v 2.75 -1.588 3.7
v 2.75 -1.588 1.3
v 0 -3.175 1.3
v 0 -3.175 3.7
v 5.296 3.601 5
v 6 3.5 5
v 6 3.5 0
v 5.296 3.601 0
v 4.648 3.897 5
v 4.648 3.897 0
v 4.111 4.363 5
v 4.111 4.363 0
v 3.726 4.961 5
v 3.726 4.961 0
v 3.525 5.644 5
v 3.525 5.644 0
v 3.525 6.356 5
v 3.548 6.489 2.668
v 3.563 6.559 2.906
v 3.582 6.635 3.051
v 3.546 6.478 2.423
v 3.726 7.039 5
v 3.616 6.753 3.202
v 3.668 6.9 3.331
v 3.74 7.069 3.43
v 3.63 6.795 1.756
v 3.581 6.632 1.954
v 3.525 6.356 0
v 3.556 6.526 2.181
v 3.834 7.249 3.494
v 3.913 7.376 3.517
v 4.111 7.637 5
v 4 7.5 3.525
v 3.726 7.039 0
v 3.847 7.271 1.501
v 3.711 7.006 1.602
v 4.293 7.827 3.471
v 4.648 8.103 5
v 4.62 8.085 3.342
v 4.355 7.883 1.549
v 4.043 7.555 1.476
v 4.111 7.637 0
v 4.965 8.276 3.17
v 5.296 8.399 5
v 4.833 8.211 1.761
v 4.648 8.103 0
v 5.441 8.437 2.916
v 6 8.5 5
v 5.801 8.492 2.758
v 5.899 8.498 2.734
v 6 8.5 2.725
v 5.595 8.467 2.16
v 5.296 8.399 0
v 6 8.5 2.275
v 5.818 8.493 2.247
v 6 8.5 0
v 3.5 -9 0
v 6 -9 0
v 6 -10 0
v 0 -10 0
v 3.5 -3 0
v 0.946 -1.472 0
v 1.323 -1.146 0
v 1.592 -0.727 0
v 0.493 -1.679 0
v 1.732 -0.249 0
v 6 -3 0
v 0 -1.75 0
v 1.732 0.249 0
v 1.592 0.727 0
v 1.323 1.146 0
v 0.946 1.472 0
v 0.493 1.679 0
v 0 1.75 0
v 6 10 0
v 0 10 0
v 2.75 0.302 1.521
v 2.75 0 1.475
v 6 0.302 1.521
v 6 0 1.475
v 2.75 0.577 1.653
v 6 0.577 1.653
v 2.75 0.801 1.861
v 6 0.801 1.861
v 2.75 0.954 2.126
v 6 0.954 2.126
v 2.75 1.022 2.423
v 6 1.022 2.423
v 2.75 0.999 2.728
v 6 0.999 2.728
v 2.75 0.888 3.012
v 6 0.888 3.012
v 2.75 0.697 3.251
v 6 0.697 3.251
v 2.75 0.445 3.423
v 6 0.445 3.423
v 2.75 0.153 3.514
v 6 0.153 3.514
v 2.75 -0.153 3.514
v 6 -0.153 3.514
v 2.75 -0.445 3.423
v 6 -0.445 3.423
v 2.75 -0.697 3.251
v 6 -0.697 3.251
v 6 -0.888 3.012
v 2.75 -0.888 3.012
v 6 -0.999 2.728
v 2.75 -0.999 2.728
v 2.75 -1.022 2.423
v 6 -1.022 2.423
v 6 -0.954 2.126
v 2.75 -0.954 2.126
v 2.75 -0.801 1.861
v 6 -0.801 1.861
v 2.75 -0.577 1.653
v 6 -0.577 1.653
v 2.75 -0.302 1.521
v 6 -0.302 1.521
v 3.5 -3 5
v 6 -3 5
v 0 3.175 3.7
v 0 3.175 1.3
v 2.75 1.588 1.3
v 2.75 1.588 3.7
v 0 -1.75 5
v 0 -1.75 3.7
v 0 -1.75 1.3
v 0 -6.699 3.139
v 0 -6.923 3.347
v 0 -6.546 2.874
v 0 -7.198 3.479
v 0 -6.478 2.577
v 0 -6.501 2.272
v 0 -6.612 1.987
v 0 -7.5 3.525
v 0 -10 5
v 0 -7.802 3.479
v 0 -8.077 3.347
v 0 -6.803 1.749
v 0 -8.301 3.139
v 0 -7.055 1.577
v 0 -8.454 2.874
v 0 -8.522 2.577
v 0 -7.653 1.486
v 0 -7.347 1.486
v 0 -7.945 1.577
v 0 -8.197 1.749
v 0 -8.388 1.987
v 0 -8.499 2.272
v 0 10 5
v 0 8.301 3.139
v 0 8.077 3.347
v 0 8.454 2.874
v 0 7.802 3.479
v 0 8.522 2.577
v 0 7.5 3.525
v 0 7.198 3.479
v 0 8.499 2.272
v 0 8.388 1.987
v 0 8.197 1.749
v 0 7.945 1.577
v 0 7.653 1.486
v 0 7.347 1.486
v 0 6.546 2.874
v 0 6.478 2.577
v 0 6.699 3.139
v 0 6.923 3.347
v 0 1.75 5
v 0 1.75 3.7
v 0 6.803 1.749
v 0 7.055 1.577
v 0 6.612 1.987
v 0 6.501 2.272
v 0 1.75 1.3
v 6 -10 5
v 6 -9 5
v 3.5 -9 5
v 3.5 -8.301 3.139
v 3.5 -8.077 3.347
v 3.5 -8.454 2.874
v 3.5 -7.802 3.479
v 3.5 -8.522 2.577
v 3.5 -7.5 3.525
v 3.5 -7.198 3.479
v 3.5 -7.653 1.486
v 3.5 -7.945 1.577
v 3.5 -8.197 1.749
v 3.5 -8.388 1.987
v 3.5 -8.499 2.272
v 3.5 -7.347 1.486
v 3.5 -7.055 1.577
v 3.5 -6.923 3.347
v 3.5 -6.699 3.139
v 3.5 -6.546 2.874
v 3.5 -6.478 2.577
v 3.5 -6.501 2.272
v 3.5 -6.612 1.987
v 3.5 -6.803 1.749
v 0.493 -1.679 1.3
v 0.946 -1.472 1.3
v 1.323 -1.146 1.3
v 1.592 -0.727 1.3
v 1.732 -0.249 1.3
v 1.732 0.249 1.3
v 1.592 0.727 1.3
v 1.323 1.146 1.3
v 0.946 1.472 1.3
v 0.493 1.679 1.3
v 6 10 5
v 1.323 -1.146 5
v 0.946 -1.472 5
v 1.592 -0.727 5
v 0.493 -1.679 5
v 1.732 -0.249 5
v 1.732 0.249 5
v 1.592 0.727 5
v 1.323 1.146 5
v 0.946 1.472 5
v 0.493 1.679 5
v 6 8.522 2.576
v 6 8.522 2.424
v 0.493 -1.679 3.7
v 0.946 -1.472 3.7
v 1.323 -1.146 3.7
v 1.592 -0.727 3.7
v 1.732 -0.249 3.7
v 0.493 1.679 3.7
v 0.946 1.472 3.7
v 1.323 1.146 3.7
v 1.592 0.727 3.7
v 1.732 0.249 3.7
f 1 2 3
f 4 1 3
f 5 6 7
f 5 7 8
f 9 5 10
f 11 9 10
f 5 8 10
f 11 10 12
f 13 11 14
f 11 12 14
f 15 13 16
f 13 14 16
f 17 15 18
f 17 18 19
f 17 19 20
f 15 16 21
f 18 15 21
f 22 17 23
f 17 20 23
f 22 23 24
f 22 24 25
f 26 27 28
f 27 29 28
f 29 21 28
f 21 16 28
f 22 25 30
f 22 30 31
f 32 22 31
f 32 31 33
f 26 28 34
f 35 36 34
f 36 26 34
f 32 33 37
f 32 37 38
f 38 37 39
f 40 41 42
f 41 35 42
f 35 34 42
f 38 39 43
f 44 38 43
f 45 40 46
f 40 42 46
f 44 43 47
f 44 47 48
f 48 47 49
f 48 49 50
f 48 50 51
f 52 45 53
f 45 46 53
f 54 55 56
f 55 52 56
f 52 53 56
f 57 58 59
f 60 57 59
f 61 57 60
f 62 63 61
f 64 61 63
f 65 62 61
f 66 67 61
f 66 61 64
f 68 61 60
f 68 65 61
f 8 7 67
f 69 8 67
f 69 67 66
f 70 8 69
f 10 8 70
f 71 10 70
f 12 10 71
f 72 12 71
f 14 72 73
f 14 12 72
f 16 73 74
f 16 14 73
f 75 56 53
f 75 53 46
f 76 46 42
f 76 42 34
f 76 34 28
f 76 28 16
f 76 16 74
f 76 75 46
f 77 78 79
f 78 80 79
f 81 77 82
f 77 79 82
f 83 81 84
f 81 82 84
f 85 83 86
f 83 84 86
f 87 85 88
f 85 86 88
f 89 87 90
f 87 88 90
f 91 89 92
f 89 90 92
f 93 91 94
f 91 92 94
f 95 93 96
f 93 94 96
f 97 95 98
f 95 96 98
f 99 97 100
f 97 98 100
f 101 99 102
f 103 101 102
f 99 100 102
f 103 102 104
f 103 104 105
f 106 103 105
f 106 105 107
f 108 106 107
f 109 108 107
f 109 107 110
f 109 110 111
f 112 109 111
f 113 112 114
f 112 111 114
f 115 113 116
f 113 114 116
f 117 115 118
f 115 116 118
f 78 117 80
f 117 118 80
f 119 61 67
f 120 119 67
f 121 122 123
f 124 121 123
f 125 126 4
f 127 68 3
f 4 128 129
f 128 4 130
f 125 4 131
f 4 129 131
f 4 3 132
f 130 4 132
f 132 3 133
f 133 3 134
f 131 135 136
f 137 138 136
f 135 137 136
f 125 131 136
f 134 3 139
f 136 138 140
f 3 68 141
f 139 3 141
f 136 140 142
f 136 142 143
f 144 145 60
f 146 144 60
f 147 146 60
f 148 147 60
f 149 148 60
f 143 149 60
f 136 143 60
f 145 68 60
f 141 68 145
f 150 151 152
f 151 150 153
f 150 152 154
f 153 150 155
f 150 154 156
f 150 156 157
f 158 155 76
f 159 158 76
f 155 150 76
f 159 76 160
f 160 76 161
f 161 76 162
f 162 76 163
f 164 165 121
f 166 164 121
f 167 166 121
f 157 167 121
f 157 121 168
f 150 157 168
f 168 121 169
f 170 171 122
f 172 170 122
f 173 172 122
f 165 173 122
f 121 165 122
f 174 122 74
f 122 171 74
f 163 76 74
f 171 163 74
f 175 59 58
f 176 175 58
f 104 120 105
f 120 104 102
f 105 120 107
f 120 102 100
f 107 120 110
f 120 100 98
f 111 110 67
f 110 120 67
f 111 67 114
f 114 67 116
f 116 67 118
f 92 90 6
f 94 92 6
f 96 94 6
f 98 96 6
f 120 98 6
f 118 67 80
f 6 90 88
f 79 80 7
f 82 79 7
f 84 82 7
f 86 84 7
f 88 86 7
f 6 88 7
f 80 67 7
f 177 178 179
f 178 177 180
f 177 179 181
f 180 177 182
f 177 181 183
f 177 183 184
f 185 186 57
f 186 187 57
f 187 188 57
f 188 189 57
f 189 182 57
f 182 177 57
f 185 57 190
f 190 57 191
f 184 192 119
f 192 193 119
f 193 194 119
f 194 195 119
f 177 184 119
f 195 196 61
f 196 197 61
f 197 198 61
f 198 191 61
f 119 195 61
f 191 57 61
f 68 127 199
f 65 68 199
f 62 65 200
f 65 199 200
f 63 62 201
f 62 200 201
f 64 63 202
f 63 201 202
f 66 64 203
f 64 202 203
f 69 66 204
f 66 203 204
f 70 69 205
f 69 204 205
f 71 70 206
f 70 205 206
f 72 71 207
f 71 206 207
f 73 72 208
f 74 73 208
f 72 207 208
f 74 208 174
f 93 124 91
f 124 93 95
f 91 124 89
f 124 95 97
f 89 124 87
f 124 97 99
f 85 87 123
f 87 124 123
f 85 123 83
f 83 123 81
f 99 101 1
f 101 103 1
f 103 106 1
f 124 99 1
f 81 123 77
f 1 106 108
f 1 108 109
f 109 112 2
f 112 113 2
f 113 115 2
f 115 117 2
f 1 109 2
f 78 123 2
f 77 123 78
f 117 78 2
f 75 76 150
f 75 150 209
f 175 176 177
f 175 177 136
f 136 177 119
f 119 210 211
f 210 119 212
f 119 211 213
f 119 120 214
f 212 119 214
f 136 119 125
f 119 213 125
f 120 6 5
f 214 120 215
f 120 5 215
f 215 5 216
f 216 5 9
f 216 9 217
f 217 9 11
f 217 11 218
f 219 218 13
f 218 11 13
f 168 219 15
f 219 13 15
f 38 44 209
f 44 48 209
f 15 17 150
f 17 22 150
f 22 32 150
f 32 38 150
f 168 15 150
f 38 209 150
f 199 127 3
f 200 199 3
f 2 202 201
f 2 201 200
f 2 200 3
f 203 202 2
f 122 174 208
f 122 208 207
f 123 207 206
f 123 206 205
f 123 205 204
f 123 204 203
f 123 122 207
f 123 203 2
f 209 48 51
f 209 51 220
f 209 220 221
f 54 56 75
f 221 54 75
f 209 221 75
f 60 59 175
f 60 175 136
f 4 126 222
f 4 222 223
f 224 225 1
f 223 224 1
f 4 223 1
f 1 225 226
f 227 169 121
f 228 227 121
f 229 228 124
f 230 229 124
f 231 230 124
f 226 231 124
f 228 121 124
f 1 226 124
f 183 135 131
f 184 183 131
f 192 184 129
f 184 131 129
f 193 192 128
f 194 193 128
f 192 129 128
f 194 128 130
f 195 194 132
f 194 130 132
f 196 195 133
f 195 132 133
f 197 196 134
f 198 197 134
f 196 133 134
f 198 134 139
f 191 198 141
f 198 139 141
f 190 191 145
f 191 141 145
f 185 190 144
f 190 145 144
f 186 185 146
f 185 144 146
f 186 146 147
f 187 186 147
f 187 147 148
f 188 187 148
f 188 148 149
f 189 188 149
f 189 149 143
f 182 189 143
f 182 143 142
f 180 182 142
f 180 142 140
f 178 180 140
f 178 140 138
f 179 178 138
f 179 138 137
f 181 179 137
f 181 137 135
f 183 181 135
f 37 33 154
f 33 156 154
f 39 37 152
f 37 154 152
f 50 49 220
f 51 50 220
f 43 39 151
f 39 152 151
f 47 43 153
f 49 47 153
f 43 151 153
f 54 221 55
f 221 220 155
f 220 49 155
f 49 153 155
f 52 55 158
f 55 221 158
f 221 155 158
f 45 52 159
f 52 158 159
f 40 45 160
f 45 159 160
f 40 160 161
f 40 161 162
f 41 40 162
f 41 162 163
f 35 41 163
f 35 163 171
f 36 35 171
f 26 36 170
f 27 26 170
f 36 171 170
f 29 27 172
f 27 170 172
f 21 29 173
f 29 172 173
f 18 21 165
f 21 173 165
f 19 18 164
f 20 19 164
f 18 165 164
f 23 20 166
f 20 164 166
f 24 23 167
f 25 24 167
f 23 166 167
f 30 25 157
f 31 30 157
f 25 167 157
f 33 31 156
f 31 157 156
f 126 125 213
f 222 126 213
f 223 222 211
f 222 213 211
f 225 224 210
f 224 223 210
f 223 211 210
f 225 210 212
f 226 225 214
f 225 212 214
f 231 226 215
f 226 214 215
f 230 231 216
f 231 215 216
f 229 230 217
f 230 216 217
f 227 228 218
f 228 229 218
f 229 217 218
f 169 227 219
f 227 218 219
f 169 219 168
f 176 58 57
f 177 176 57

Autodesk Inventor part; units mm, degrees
ref_plane "YZ Plane" through (0, 0, 0) normal (1, 0, 0) x (0, 1, 0)
ref_plane "XZ Plane" through (0, 0, 0) normal (0, 1, 0) x (-1, 0, 0)
sketch "Sketch1" plane through (0, 0, 0) normal (0, 0, 1) x (1, 0, 0)
  line L0 (10, -10) -> (-10, -10)
  line L1 (-10, -10) -> (-10, 10)
  line L2 (-10, 10) -> (10, 10)
  line L3 (10, 10) -> (10, -10)
  line L4 (10, -10) -> (-10, 10) construction
  line L5 (-10, -10) -> (10, 10) construction
  line L6 (10, -10) -> (6, -10)
  line L7 (6, -10) -> (6, 10)
  line L8 (6, 10) -> (10, 10)
  line L9 (10, 10) -> (10, -10)
  line L10 (6, 2) -> (4, 2)
  line L11 (4, 2) -> (4, -2)
  line L12 (4, -2) -> (6, -2)
  line L13 (6, -2) -> (6, 2)
  line L14 (0, 10) -> (0, -10)
  point P0 (0, 0)
  dimension "d0" = 20
  dimension "d1" = 20
  dimension "d2" = 4
  dimension "d6" = 2
  dimension "d7" = 2
  dimension "d8" = 4
  dimension "d9" = 2
extrude "Extrusion1" add sketch "Sketch1" along normal blind 5 contours L0 L14 L2 L7 L10 L11 L12
ref_plane "Work Plane1" through (0, 0, 2.5) normal (0, 0, 1) x (1, 0, 0)
sketch "Sketch2" plane through (0, 0, 2.5) normal (0, 0, 1) x (1, 0, 0)
  line L0 (0, 10) -> (0, -10) projected
  line L1 (0, 3.1754) -> (2.75, 1.5877)
  line L2 (2.75, 1.5877) -> (2.75, -1.5877)
  line L3 (2.75, -1.5877) -> (0, -3.1754)
  line L4 (0, -3.1754) -> (-2.75, -1.5877)
  line L5 (-2.75, -1.5877) -> (-2.75, 1.5877)
  line L6 (-2.75, 1.5877) -> (0, 3.1754)
  point P0 (0, 0)
  point P1 (0, 0)
  dimension "d12" = 5.5
extrude "Extrusion2" cut sketch "Sketch2" along normal mid plane 2.4
sketch "Sketch3" plane through (0, 0, 5) normal (0, 0, 1) x (1, 0, 0)
  circle A0 centre (0, 0) radius 1.75
  dimension "d15" = 3.5
extrude "Extrusion3" cut sketch "Sketch3" against normal blind 8
sketch "Sketch4" plane through (0, 10, 0) normal (-1, 0, 0) x (0, 0, 1)
  circle A0 centre (2.5, -2.5) radius 1.025
  circle A1 centre (2.5, -17.5) radius 1.025
  line L0 (0, 0) -> (5, 0) projected
  line L1 (0, 0) -> (0, -8.25) projected
  line L2 (0, -11.75) -> (0, -20) projected
  line L3 (0, -20) -> (5, -20) projected
  point P0 (0, -10)
  dimension "d18" = 2.05
  dimension "d19" = 2.05
  dimension "d20" = 2.5
  dimension "d21" = 2.5
  dimension "d22" = 2.5
  dimension "d23" = 2.5
extrude "Extrusion4" cut sketch "Sketch4" against normal blind 25
sketch "Sketch5" plane through (0, 0, 0) normal (0, 0, -1) x (-1, 0, 0)
  line L0 (-6, -2) -> (-4, -2) projected
  line L1 (-4, -2) -> (-6, -2)
  line L2 (-6, -2) -> (-6, 2)
  line L3 (-6, 2) -> (-4, 2)
  line L4 (-4, 2) -> (-4, -2)
  point P0 (0, 0)
extrude "Extrusion5" add sketch "Sketch5" against normal blind 5
sketch "Sketch6" plane through (0, 0, 0) normal (0, 0, -1) x (-1, 0, 0)
  line L0 (-6, -10) -> (-6, 10) projected
  circle A0 centre (-6, 6) radius 2.5
  line L1 (-6, -9) -> (-3.5, -9)
  line L2 (-3.5, -9) -> (-3.5, -3)
  line L3 (-3.5, -3) -> (-6, -3)
  line L4 (-6, -3) -> (-6, -9)
  line L5 (0, -10) -> (-6, -10) projected
  line L6 (-6, 10) -> (0, 10) projected
  point P0 (0, 0)
  dimension "d32" = 2.5
  dimension "d33" = 1
  dimension "d34" = 6
  dimension "d35" = 5
  dimension "d36" = 4
extrude "Extrusion6" cut sketch "Sketch6" against normal blind 5
sketch "Sketch7" plane through (6, -3, 0) normal (1, 0, 0) x (0, 0, -1)
  circle A0 centre (-2.5, 3) radius 1.025
  line L0 (0, 0) -> (0, 6.5) projected
  line L1 (0, -7) -> (-5, -7) projected
  point P0 (0, 3)
  dimension "d39" = 2.5
  dimension "d40" = 10
  dimension "d41" = 2.05
extrude "Extrusion7" cut sketch "Sketch7" against normal blind 20
equation "\"d19\" = d18"
properties part number "POMSliderMotor" material "Acetal Resin, White"
